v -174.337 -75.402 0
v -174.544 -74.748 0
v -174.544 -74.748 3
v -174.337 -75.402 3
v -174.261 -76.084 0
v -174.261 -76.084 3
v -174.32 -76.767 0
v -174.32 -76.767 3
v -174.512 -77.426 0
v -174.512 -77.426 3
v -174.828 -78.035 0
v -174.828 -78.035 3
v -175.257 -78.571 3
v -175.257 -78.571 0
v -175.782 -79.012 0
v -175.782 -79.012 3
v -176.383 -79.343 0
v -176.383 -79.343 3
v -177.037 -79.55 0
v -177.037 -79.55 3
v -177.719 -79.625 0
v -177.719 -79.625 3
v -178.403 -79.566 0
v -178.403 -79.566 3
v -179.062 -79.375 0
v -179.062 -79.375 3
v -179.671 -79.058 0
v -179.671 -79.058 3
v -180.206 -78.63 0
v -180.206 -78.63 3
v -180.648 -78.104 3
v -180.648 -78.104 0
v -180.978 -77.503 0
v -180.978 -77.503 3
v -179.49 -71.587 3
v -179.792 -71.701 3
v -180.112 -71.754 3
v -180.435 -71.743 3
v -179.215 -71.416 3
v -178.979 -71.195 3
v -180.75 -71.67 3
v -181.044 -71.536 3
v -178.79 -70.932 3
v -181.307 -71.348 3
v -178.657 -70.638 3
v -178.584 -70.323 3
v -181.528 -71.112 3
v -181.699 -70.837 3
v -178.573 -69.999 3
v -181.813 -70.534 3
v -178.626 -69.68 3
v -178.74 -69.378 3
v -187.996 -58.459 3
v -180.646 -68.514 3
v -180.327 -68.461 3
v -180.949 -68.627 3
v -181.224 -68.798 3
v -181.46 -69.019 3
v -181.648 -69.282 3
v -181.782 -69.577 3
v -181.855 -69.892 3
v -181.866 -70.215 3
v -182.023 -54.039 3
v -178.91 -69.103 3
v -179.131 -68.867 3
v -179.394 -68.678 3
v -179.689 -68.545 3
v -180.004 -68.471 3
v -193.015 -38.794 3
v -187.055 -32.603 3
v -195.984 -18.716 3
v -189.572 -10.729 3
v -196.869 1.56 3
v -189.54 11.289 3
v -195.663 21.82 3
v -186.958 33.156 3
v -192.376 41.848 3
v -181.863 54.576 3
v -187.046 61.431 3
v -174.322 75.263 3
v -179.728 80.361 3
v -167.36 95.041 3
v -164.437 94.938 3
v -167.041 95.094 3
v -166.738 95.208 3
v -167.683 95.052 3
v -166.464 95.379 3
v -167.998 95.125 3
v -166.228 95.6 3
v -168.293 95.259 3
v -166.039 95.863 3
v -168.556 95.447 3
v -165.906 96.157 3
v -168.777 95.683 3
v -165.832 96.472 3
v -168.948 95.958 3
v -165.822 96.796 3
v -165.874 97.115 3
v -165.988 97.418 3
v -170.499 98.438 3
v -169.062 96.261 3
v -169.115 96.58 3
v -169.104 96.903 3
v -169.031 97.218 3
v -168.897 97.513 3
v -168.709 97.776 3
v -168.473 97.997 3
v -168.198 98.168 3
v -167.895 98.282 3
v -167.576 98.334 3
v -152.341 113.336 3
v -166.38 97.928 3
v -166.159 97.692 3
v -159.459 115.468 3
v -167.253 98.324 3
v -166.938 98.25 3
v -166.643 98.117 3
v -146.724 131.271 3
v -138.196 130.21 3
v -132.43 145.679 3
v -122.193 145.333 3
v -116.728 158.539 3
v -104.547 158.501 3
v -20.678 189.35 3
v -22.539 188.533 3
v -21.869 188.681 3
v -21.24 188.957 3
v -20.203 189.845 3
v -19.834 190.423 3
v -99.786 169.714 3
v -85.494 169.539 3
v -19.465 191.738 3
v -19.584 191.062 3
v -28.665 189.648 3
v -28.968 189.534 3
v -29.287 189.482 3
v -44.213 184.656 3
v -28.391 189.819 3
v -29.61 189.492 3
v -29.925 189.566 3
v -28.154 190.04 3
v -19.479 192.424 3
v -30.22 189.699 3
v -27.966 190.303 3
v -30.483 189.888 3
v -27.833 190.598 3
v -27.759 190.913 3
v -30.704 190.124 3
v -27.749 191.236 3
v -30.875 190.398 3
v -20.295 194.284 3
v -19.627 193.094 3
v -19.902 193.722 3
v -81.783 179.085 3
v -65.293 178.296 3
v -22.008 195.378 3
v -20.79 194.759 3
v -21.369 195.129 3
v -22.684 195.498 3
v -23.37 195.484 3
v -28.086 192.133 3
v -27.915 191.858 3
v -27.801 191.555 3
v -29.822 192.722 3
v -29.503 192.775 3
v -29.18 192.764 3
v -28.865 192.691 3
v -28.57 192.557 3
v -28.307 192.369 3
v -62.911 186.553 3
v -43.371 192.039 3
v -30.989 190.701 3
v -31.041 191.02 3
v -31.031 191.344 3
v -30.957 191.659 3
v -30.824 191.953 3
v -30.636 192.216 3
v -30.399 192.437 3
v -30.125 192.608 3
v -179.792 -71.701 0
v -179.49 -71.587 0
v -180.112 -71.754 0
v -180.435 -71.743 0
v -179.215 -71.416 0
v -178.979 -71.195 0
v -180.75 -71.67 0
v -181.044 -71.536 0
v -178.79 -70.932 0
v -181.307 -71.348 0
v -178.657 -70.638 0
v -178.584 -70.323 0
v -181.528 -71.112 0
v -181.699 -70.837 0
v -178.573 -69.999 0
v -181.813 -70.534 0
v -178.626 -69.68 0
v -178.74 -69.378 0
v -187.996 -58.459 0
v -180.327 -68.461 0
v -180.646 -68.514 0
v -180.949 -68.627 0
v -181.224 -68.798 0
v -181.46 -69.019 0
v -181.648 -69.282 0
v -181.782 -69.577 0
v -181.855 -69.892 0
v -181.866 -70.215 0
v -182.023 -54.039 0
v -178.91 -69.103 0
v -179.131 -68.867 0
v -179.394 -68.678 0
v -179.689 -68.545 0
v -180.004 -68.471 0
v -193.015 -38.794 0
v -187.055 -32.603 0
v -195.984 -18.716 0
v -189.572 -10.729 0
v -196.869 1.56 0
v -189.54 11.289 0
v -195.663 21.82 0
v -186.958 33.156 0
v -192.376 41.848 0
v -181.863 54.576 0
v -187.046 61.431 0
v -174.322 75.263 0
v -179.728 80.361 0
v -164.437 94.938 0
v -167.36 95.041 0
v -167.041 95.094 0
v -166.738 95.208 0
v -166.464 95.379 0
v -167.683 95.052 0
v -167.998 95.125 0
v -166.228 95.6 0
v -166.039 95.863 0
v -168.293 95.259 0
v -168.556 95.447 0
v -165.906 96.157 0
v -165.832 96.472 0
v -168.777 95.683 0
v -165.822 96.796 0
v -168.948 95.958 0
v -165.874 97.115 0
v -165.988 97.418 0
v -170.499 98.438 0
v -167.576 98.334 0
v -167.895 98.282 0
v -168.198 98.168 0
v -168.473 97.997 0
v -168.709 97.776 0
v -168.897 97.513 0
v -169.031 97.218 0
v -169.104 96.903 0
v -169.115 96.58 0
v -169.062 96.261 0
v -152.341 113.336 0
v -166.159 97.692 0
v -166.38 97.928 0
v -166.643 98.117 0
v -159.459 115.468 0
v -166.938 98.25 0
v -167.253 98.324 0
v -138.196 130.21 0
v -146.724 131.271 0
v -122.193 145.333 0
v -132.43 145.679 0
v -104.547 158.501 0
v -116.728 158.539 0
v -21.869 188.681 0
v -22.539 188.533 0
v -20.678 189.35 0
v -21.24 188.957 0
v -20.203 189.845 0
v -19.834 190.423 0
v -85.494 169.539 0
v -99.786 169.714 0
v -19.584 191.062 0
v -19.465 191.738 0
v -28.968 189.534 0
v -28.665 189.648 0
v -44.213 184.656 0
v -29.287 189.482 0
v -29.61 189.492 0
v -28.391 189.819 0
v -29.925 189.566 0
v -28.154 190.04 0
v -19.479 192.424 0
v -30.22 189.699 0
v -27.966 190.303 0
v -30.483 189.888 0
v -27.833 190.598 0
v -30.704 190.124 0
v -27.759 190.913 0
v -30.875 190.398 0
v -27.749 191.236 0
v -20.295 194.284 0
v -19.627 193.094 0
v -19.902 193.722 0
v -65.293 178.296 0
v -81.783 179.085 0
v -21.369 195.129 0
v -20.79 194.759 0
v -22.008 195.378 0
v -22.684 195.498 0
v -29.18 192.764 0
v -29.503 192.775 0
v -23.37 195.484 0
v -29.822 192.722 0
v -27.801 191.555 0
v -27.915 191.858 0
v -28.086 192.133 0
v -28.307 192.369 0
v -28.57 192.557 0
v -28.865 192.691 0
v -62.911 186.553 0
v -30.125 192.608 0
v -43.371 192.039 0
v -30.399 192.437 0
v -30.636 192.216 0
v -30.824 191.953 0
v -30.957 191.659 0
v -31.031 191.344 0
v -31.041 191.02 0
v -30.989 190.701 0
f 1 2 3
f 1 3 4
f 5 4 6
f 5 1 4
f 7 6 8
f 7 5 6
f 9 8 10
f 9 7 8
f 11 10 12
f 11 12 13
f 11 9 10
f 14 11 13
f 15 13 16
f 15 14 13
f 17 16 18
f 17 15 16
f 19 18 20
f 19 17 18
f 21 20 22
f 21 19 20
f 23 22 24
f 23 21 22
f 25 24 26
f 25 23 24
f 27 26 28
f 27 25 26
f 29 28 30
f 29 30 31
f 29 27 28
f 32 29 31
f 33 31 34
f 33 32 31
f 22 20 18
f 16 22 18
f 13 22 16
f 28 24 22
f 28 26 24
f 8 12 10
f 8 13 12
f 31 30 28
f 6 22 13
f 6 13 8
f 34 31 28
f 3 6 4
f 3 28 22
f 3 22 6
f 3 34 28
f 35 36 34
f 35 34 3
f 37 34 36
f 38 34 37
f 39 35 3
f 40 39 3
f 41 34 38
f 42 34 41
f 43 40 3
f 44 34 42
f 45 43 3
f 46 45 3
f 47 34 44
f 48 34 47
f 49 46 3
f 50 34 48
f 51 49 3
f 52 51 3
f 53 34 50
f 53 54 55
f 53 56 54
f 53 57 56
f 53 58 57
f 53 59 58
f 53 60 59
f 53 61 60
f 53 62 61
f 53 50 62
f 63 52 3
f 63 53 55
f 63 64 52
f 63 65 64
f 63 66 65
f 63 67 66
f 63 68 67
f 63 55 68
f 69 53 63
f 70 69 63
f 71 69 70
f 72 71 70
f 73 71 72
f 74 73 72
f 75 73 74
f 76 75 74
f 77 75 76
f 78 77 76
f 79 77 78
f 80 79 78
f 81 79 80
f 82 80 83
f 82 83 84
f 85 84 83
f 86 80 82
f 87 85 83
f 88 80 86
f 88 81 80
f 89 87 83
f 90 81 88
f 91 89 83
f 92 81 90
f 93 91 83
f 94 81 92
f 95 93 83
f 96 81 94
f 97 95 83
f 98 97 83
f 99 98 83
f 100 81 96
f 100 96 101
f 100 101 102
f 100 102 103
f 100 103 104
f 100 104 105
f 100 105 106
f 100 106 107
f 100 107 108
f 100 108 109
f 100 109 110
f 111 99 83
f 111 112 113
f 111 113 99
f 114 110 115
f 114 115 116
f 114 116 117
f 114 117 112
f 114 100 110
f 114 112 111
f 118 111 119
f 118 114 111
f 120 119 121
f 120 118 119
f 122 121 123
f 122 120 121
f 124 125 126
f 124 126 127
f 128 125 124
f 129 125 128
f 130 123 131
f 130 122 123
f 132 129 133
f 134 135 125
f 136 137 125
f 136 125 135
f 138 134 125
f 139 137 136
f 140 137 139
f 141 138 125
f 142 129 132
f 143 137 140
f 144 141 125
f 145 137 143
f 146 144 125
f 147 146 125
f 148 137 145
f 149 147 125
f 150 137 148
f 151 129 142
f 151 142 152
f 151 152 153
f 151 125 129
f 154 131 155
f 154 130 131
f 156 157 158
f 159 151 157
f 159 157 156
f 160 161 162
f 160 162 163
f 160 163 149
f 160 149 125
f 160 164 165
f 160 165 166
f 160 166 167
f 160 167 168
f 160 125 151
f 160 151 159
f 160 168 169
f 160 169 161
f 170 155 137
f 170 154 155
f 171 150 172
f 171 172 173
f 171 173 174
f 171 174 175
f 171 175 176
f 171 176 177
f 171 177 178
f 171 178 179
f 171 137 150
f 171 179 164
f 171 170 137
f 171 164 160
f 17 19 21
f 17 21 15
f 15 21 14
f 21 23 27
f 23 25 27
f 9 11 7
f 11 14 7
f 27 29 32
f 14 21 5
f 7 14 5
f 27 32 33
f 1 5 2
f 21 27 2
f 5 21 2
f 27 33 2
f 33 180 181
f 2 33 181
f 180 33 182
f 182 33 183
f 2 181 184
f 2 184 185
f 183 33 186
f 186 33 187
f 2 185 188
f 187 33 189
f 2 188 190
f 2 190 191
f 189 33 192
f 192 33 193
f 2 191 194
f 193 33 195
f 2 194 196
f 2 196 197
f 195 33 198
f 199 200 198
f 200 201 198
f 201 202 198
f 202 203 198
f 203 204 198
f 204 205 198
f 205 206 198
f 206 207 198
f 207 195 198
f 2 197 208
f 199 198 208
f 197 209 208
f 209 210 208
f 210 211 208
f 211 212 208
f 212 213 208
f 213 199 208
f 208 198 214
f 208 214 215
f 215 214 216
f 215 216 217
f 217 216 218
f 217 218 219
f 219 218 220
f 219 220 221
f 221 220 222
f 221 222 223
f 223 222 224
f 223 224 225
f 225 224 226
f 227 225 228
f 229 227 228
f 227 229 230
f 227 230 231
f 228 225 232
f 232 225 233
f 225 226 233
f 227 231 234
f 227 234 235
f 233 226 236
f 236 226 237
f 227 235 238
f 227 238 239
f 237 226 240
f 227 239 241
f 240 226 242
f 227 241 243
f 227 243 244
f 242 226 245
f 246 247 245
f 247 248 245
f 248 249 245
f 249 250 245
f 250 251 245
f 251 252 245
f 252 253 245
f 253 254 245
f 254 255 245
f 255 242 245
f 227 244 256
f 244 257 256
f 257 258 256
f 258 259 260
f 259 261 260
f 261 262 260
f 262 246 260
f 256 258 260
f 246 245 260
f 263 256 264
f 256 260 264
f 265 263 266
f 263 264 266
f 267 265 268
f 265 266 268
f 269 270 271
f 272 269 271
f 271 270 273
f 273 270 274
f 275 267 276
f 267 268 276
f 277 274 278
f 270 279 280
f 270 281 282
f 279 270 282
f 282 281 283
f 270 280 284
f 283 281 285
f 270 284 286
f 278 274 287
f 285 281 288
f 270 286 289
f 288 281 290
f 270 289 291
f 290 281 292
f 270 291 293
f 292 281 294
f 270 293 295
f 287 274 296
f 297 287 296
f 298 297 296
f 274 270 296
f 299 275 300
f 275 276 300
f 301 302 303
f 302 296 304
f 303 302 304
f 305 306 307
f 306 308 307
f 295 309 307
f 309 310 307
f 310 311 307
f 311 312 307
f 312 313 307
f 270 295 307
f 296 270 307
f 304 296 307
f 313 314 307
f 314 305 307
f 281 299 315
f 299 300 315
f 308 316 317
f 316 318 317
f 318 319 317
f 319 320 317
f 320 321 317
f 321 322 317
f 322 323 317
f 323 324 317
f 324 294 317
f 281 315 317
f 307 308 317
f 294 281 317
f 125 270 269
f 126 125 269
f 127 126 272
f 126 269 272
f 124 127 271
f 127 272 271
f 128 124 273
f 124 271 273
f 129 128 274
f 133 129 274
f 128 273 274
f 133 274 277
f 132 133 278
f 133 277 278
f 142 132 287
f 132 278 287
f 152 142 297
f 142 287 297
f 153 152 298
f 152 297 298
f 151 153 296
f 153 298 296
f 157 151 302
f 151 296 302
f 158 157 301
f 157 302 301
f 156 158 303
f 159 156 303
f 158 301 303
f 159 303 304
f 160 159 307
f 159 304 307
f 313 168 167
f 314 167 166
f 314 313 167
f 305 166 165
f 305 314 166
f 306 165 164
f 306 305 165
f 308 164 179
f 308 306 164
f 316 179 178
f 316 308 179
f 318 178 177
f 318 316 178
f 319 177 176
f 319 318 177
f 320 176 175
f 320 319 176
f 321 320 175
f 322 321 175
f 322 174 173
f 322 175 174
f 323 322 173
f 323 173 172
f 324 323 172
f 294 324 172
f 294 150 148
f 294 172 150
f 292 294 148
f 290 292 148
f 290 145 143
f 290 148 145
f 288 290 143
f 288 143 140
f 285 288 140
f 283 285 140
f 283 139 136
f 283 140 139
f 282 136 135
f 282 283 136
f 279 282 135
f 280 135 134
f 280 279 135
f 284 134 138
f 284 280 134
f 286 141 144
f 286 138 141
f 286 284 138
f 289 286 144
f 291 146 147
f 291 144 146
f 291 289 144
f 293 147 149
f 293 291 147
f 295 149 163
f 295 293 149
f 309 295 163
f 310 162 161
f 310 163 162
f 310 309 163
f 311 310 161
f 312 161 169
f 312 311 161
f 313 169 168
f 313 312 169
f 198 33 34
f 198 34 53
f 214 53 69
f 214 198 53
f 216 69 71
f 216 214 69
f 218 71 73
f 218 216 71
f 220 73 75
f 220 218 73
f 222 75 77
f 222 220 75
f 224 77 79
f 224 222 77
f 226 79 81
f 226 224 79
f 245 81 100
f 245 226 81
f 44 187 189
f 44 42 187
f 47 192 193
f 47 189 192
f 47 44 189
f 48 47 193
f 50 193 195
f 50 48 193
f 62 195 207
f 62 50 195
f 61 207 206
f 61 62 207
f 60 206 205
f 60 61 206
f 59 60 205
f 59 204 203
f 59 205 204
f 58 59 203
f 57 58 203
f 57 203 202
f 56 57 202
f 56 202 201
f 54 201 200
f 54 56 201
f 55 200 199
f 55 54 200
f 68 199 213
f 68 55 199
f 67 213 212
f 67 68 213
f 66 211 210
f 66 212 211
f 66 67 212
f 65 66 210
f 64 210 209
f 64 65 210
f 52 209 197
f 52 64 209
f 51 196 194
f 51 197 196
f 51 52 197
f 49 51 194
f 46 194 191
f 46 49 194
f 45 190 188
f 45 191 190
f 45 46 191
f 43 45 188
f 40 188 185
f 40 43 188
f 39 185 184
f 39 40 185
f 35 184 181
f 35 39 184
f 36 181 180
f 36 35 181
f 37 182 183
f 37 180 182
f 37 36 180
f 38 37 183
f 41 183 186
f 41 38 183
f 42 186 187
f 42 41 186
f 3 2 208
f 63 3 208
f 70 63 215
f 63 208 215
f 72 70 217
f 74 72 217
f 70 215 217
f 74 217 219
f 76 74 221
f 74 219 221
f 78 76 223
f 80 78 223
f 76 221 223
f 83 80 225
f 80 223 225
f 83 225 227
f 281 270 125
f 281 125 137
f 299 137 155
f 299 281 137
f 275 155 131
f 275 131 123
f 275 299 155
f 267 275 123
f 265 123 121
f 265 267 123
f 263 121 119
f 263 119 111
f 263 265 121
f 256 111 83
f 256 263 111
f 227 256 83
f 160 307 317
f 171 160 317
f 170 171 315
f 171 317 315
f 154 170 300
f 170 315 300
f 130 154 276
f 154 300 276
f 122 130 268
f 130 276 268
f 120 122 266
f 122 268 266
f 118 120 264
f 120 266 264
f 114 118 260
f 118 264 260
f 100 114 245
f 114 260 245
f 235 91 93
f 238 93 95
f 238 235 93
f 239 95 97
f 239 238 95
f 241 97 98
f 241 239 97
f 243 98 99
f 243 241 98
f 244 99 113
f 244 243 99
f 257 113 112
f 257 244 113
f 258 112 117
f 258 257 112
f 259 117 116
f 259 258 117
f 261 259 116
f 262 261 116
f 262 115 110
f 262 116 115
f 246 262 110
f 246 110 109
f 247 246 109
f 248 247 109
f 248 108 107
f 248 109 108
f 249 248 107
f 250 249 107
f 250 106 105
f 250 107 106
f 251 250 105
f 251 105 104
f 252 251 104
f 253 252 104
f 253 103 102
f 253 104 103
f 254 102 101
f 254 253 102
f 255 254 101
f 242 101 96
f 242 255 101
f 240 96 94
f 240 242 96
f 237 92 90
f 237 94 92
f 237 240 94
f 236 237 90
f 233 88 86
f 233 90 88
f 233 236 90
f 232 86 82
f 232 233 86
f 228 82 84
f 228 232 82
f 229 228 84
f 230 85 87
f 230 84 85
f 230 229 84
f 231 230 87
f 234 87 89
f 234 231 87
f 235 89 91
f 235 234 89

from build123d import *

# Parameters (mm, degrees)
PAD015_DEPTH                        = 3
SKETCH054_R                         = 1.65
POCKET018_DEPTH                     = 358.938883
POCKET018_DEPTH_BACK                = 361.938883
BODY001003005003004_PLACEMENT_ANGLE = 60


with BuildPart() as part:
    # Sketch053 → Pad015 (new body)
    with BuildSketch(Plane.XY):
        with BuildLine():
            ThreePointArc((152.005097, 113.785532), (84.992984, 169.790723), (0, 189.875477))
            Line((0, 189.875477), (0, 196.875477))
            ThreePointArc((157.608957, 117.98038), (88.126358, 176.050273), (0, 196.875477))
            ThreePointArc((152.005097, 113.785532), (156.904451, 113.081026), (157.608957, 117.98038))
        make_face()
    pad015 = extrude(amount=PAD015_DEPTH)

    # Sketch054 → Pocket018 (cut, two sides)
    with BuildSketch(Plane.XY) as pocket018_sk:
        with Locations((150.82443, 121.020933)):
            Circle(SKETCH054_R)
        with BuildLine():
            ThreePointArc((0, 191.725477), (1.65, 193.375477), (0, 195.025477))
            Line((0, 191.725477), (0, 195.025477))
        make_face()
    pocket018 = extrude(amount=-POCKET018_DEPTH, mode=Mode.SUBTRACT) + extrude(pocket018_sk.sketch, amount=POCKET018_DEPTH_BACK, mode=Mode.SUBTRACT)

    # Mirrored020: Pad015, Pocket018 across Sketch053 V_Axis
    add(pad015.mirror(Plane(origin=(0, 0, 0), x_dir=(0, 0, 1), z_dir=(1, 0, 0))))
    add(pocket018.mirror(Plane(origin=(0, 0, 0), x_dir=(0, 0, 1), z_dir=(1, 0, 0))), mode=Mode.SUBTRACT)


with BuildPart() as part_1:
    # Body001003005003004 placement: moved
    add(part.part.rotate(Axis((0, 0, 0), (0, 0, 1)), BODY001003005003004_PLACEMENT_ANGLE))


solid = part_1.part
